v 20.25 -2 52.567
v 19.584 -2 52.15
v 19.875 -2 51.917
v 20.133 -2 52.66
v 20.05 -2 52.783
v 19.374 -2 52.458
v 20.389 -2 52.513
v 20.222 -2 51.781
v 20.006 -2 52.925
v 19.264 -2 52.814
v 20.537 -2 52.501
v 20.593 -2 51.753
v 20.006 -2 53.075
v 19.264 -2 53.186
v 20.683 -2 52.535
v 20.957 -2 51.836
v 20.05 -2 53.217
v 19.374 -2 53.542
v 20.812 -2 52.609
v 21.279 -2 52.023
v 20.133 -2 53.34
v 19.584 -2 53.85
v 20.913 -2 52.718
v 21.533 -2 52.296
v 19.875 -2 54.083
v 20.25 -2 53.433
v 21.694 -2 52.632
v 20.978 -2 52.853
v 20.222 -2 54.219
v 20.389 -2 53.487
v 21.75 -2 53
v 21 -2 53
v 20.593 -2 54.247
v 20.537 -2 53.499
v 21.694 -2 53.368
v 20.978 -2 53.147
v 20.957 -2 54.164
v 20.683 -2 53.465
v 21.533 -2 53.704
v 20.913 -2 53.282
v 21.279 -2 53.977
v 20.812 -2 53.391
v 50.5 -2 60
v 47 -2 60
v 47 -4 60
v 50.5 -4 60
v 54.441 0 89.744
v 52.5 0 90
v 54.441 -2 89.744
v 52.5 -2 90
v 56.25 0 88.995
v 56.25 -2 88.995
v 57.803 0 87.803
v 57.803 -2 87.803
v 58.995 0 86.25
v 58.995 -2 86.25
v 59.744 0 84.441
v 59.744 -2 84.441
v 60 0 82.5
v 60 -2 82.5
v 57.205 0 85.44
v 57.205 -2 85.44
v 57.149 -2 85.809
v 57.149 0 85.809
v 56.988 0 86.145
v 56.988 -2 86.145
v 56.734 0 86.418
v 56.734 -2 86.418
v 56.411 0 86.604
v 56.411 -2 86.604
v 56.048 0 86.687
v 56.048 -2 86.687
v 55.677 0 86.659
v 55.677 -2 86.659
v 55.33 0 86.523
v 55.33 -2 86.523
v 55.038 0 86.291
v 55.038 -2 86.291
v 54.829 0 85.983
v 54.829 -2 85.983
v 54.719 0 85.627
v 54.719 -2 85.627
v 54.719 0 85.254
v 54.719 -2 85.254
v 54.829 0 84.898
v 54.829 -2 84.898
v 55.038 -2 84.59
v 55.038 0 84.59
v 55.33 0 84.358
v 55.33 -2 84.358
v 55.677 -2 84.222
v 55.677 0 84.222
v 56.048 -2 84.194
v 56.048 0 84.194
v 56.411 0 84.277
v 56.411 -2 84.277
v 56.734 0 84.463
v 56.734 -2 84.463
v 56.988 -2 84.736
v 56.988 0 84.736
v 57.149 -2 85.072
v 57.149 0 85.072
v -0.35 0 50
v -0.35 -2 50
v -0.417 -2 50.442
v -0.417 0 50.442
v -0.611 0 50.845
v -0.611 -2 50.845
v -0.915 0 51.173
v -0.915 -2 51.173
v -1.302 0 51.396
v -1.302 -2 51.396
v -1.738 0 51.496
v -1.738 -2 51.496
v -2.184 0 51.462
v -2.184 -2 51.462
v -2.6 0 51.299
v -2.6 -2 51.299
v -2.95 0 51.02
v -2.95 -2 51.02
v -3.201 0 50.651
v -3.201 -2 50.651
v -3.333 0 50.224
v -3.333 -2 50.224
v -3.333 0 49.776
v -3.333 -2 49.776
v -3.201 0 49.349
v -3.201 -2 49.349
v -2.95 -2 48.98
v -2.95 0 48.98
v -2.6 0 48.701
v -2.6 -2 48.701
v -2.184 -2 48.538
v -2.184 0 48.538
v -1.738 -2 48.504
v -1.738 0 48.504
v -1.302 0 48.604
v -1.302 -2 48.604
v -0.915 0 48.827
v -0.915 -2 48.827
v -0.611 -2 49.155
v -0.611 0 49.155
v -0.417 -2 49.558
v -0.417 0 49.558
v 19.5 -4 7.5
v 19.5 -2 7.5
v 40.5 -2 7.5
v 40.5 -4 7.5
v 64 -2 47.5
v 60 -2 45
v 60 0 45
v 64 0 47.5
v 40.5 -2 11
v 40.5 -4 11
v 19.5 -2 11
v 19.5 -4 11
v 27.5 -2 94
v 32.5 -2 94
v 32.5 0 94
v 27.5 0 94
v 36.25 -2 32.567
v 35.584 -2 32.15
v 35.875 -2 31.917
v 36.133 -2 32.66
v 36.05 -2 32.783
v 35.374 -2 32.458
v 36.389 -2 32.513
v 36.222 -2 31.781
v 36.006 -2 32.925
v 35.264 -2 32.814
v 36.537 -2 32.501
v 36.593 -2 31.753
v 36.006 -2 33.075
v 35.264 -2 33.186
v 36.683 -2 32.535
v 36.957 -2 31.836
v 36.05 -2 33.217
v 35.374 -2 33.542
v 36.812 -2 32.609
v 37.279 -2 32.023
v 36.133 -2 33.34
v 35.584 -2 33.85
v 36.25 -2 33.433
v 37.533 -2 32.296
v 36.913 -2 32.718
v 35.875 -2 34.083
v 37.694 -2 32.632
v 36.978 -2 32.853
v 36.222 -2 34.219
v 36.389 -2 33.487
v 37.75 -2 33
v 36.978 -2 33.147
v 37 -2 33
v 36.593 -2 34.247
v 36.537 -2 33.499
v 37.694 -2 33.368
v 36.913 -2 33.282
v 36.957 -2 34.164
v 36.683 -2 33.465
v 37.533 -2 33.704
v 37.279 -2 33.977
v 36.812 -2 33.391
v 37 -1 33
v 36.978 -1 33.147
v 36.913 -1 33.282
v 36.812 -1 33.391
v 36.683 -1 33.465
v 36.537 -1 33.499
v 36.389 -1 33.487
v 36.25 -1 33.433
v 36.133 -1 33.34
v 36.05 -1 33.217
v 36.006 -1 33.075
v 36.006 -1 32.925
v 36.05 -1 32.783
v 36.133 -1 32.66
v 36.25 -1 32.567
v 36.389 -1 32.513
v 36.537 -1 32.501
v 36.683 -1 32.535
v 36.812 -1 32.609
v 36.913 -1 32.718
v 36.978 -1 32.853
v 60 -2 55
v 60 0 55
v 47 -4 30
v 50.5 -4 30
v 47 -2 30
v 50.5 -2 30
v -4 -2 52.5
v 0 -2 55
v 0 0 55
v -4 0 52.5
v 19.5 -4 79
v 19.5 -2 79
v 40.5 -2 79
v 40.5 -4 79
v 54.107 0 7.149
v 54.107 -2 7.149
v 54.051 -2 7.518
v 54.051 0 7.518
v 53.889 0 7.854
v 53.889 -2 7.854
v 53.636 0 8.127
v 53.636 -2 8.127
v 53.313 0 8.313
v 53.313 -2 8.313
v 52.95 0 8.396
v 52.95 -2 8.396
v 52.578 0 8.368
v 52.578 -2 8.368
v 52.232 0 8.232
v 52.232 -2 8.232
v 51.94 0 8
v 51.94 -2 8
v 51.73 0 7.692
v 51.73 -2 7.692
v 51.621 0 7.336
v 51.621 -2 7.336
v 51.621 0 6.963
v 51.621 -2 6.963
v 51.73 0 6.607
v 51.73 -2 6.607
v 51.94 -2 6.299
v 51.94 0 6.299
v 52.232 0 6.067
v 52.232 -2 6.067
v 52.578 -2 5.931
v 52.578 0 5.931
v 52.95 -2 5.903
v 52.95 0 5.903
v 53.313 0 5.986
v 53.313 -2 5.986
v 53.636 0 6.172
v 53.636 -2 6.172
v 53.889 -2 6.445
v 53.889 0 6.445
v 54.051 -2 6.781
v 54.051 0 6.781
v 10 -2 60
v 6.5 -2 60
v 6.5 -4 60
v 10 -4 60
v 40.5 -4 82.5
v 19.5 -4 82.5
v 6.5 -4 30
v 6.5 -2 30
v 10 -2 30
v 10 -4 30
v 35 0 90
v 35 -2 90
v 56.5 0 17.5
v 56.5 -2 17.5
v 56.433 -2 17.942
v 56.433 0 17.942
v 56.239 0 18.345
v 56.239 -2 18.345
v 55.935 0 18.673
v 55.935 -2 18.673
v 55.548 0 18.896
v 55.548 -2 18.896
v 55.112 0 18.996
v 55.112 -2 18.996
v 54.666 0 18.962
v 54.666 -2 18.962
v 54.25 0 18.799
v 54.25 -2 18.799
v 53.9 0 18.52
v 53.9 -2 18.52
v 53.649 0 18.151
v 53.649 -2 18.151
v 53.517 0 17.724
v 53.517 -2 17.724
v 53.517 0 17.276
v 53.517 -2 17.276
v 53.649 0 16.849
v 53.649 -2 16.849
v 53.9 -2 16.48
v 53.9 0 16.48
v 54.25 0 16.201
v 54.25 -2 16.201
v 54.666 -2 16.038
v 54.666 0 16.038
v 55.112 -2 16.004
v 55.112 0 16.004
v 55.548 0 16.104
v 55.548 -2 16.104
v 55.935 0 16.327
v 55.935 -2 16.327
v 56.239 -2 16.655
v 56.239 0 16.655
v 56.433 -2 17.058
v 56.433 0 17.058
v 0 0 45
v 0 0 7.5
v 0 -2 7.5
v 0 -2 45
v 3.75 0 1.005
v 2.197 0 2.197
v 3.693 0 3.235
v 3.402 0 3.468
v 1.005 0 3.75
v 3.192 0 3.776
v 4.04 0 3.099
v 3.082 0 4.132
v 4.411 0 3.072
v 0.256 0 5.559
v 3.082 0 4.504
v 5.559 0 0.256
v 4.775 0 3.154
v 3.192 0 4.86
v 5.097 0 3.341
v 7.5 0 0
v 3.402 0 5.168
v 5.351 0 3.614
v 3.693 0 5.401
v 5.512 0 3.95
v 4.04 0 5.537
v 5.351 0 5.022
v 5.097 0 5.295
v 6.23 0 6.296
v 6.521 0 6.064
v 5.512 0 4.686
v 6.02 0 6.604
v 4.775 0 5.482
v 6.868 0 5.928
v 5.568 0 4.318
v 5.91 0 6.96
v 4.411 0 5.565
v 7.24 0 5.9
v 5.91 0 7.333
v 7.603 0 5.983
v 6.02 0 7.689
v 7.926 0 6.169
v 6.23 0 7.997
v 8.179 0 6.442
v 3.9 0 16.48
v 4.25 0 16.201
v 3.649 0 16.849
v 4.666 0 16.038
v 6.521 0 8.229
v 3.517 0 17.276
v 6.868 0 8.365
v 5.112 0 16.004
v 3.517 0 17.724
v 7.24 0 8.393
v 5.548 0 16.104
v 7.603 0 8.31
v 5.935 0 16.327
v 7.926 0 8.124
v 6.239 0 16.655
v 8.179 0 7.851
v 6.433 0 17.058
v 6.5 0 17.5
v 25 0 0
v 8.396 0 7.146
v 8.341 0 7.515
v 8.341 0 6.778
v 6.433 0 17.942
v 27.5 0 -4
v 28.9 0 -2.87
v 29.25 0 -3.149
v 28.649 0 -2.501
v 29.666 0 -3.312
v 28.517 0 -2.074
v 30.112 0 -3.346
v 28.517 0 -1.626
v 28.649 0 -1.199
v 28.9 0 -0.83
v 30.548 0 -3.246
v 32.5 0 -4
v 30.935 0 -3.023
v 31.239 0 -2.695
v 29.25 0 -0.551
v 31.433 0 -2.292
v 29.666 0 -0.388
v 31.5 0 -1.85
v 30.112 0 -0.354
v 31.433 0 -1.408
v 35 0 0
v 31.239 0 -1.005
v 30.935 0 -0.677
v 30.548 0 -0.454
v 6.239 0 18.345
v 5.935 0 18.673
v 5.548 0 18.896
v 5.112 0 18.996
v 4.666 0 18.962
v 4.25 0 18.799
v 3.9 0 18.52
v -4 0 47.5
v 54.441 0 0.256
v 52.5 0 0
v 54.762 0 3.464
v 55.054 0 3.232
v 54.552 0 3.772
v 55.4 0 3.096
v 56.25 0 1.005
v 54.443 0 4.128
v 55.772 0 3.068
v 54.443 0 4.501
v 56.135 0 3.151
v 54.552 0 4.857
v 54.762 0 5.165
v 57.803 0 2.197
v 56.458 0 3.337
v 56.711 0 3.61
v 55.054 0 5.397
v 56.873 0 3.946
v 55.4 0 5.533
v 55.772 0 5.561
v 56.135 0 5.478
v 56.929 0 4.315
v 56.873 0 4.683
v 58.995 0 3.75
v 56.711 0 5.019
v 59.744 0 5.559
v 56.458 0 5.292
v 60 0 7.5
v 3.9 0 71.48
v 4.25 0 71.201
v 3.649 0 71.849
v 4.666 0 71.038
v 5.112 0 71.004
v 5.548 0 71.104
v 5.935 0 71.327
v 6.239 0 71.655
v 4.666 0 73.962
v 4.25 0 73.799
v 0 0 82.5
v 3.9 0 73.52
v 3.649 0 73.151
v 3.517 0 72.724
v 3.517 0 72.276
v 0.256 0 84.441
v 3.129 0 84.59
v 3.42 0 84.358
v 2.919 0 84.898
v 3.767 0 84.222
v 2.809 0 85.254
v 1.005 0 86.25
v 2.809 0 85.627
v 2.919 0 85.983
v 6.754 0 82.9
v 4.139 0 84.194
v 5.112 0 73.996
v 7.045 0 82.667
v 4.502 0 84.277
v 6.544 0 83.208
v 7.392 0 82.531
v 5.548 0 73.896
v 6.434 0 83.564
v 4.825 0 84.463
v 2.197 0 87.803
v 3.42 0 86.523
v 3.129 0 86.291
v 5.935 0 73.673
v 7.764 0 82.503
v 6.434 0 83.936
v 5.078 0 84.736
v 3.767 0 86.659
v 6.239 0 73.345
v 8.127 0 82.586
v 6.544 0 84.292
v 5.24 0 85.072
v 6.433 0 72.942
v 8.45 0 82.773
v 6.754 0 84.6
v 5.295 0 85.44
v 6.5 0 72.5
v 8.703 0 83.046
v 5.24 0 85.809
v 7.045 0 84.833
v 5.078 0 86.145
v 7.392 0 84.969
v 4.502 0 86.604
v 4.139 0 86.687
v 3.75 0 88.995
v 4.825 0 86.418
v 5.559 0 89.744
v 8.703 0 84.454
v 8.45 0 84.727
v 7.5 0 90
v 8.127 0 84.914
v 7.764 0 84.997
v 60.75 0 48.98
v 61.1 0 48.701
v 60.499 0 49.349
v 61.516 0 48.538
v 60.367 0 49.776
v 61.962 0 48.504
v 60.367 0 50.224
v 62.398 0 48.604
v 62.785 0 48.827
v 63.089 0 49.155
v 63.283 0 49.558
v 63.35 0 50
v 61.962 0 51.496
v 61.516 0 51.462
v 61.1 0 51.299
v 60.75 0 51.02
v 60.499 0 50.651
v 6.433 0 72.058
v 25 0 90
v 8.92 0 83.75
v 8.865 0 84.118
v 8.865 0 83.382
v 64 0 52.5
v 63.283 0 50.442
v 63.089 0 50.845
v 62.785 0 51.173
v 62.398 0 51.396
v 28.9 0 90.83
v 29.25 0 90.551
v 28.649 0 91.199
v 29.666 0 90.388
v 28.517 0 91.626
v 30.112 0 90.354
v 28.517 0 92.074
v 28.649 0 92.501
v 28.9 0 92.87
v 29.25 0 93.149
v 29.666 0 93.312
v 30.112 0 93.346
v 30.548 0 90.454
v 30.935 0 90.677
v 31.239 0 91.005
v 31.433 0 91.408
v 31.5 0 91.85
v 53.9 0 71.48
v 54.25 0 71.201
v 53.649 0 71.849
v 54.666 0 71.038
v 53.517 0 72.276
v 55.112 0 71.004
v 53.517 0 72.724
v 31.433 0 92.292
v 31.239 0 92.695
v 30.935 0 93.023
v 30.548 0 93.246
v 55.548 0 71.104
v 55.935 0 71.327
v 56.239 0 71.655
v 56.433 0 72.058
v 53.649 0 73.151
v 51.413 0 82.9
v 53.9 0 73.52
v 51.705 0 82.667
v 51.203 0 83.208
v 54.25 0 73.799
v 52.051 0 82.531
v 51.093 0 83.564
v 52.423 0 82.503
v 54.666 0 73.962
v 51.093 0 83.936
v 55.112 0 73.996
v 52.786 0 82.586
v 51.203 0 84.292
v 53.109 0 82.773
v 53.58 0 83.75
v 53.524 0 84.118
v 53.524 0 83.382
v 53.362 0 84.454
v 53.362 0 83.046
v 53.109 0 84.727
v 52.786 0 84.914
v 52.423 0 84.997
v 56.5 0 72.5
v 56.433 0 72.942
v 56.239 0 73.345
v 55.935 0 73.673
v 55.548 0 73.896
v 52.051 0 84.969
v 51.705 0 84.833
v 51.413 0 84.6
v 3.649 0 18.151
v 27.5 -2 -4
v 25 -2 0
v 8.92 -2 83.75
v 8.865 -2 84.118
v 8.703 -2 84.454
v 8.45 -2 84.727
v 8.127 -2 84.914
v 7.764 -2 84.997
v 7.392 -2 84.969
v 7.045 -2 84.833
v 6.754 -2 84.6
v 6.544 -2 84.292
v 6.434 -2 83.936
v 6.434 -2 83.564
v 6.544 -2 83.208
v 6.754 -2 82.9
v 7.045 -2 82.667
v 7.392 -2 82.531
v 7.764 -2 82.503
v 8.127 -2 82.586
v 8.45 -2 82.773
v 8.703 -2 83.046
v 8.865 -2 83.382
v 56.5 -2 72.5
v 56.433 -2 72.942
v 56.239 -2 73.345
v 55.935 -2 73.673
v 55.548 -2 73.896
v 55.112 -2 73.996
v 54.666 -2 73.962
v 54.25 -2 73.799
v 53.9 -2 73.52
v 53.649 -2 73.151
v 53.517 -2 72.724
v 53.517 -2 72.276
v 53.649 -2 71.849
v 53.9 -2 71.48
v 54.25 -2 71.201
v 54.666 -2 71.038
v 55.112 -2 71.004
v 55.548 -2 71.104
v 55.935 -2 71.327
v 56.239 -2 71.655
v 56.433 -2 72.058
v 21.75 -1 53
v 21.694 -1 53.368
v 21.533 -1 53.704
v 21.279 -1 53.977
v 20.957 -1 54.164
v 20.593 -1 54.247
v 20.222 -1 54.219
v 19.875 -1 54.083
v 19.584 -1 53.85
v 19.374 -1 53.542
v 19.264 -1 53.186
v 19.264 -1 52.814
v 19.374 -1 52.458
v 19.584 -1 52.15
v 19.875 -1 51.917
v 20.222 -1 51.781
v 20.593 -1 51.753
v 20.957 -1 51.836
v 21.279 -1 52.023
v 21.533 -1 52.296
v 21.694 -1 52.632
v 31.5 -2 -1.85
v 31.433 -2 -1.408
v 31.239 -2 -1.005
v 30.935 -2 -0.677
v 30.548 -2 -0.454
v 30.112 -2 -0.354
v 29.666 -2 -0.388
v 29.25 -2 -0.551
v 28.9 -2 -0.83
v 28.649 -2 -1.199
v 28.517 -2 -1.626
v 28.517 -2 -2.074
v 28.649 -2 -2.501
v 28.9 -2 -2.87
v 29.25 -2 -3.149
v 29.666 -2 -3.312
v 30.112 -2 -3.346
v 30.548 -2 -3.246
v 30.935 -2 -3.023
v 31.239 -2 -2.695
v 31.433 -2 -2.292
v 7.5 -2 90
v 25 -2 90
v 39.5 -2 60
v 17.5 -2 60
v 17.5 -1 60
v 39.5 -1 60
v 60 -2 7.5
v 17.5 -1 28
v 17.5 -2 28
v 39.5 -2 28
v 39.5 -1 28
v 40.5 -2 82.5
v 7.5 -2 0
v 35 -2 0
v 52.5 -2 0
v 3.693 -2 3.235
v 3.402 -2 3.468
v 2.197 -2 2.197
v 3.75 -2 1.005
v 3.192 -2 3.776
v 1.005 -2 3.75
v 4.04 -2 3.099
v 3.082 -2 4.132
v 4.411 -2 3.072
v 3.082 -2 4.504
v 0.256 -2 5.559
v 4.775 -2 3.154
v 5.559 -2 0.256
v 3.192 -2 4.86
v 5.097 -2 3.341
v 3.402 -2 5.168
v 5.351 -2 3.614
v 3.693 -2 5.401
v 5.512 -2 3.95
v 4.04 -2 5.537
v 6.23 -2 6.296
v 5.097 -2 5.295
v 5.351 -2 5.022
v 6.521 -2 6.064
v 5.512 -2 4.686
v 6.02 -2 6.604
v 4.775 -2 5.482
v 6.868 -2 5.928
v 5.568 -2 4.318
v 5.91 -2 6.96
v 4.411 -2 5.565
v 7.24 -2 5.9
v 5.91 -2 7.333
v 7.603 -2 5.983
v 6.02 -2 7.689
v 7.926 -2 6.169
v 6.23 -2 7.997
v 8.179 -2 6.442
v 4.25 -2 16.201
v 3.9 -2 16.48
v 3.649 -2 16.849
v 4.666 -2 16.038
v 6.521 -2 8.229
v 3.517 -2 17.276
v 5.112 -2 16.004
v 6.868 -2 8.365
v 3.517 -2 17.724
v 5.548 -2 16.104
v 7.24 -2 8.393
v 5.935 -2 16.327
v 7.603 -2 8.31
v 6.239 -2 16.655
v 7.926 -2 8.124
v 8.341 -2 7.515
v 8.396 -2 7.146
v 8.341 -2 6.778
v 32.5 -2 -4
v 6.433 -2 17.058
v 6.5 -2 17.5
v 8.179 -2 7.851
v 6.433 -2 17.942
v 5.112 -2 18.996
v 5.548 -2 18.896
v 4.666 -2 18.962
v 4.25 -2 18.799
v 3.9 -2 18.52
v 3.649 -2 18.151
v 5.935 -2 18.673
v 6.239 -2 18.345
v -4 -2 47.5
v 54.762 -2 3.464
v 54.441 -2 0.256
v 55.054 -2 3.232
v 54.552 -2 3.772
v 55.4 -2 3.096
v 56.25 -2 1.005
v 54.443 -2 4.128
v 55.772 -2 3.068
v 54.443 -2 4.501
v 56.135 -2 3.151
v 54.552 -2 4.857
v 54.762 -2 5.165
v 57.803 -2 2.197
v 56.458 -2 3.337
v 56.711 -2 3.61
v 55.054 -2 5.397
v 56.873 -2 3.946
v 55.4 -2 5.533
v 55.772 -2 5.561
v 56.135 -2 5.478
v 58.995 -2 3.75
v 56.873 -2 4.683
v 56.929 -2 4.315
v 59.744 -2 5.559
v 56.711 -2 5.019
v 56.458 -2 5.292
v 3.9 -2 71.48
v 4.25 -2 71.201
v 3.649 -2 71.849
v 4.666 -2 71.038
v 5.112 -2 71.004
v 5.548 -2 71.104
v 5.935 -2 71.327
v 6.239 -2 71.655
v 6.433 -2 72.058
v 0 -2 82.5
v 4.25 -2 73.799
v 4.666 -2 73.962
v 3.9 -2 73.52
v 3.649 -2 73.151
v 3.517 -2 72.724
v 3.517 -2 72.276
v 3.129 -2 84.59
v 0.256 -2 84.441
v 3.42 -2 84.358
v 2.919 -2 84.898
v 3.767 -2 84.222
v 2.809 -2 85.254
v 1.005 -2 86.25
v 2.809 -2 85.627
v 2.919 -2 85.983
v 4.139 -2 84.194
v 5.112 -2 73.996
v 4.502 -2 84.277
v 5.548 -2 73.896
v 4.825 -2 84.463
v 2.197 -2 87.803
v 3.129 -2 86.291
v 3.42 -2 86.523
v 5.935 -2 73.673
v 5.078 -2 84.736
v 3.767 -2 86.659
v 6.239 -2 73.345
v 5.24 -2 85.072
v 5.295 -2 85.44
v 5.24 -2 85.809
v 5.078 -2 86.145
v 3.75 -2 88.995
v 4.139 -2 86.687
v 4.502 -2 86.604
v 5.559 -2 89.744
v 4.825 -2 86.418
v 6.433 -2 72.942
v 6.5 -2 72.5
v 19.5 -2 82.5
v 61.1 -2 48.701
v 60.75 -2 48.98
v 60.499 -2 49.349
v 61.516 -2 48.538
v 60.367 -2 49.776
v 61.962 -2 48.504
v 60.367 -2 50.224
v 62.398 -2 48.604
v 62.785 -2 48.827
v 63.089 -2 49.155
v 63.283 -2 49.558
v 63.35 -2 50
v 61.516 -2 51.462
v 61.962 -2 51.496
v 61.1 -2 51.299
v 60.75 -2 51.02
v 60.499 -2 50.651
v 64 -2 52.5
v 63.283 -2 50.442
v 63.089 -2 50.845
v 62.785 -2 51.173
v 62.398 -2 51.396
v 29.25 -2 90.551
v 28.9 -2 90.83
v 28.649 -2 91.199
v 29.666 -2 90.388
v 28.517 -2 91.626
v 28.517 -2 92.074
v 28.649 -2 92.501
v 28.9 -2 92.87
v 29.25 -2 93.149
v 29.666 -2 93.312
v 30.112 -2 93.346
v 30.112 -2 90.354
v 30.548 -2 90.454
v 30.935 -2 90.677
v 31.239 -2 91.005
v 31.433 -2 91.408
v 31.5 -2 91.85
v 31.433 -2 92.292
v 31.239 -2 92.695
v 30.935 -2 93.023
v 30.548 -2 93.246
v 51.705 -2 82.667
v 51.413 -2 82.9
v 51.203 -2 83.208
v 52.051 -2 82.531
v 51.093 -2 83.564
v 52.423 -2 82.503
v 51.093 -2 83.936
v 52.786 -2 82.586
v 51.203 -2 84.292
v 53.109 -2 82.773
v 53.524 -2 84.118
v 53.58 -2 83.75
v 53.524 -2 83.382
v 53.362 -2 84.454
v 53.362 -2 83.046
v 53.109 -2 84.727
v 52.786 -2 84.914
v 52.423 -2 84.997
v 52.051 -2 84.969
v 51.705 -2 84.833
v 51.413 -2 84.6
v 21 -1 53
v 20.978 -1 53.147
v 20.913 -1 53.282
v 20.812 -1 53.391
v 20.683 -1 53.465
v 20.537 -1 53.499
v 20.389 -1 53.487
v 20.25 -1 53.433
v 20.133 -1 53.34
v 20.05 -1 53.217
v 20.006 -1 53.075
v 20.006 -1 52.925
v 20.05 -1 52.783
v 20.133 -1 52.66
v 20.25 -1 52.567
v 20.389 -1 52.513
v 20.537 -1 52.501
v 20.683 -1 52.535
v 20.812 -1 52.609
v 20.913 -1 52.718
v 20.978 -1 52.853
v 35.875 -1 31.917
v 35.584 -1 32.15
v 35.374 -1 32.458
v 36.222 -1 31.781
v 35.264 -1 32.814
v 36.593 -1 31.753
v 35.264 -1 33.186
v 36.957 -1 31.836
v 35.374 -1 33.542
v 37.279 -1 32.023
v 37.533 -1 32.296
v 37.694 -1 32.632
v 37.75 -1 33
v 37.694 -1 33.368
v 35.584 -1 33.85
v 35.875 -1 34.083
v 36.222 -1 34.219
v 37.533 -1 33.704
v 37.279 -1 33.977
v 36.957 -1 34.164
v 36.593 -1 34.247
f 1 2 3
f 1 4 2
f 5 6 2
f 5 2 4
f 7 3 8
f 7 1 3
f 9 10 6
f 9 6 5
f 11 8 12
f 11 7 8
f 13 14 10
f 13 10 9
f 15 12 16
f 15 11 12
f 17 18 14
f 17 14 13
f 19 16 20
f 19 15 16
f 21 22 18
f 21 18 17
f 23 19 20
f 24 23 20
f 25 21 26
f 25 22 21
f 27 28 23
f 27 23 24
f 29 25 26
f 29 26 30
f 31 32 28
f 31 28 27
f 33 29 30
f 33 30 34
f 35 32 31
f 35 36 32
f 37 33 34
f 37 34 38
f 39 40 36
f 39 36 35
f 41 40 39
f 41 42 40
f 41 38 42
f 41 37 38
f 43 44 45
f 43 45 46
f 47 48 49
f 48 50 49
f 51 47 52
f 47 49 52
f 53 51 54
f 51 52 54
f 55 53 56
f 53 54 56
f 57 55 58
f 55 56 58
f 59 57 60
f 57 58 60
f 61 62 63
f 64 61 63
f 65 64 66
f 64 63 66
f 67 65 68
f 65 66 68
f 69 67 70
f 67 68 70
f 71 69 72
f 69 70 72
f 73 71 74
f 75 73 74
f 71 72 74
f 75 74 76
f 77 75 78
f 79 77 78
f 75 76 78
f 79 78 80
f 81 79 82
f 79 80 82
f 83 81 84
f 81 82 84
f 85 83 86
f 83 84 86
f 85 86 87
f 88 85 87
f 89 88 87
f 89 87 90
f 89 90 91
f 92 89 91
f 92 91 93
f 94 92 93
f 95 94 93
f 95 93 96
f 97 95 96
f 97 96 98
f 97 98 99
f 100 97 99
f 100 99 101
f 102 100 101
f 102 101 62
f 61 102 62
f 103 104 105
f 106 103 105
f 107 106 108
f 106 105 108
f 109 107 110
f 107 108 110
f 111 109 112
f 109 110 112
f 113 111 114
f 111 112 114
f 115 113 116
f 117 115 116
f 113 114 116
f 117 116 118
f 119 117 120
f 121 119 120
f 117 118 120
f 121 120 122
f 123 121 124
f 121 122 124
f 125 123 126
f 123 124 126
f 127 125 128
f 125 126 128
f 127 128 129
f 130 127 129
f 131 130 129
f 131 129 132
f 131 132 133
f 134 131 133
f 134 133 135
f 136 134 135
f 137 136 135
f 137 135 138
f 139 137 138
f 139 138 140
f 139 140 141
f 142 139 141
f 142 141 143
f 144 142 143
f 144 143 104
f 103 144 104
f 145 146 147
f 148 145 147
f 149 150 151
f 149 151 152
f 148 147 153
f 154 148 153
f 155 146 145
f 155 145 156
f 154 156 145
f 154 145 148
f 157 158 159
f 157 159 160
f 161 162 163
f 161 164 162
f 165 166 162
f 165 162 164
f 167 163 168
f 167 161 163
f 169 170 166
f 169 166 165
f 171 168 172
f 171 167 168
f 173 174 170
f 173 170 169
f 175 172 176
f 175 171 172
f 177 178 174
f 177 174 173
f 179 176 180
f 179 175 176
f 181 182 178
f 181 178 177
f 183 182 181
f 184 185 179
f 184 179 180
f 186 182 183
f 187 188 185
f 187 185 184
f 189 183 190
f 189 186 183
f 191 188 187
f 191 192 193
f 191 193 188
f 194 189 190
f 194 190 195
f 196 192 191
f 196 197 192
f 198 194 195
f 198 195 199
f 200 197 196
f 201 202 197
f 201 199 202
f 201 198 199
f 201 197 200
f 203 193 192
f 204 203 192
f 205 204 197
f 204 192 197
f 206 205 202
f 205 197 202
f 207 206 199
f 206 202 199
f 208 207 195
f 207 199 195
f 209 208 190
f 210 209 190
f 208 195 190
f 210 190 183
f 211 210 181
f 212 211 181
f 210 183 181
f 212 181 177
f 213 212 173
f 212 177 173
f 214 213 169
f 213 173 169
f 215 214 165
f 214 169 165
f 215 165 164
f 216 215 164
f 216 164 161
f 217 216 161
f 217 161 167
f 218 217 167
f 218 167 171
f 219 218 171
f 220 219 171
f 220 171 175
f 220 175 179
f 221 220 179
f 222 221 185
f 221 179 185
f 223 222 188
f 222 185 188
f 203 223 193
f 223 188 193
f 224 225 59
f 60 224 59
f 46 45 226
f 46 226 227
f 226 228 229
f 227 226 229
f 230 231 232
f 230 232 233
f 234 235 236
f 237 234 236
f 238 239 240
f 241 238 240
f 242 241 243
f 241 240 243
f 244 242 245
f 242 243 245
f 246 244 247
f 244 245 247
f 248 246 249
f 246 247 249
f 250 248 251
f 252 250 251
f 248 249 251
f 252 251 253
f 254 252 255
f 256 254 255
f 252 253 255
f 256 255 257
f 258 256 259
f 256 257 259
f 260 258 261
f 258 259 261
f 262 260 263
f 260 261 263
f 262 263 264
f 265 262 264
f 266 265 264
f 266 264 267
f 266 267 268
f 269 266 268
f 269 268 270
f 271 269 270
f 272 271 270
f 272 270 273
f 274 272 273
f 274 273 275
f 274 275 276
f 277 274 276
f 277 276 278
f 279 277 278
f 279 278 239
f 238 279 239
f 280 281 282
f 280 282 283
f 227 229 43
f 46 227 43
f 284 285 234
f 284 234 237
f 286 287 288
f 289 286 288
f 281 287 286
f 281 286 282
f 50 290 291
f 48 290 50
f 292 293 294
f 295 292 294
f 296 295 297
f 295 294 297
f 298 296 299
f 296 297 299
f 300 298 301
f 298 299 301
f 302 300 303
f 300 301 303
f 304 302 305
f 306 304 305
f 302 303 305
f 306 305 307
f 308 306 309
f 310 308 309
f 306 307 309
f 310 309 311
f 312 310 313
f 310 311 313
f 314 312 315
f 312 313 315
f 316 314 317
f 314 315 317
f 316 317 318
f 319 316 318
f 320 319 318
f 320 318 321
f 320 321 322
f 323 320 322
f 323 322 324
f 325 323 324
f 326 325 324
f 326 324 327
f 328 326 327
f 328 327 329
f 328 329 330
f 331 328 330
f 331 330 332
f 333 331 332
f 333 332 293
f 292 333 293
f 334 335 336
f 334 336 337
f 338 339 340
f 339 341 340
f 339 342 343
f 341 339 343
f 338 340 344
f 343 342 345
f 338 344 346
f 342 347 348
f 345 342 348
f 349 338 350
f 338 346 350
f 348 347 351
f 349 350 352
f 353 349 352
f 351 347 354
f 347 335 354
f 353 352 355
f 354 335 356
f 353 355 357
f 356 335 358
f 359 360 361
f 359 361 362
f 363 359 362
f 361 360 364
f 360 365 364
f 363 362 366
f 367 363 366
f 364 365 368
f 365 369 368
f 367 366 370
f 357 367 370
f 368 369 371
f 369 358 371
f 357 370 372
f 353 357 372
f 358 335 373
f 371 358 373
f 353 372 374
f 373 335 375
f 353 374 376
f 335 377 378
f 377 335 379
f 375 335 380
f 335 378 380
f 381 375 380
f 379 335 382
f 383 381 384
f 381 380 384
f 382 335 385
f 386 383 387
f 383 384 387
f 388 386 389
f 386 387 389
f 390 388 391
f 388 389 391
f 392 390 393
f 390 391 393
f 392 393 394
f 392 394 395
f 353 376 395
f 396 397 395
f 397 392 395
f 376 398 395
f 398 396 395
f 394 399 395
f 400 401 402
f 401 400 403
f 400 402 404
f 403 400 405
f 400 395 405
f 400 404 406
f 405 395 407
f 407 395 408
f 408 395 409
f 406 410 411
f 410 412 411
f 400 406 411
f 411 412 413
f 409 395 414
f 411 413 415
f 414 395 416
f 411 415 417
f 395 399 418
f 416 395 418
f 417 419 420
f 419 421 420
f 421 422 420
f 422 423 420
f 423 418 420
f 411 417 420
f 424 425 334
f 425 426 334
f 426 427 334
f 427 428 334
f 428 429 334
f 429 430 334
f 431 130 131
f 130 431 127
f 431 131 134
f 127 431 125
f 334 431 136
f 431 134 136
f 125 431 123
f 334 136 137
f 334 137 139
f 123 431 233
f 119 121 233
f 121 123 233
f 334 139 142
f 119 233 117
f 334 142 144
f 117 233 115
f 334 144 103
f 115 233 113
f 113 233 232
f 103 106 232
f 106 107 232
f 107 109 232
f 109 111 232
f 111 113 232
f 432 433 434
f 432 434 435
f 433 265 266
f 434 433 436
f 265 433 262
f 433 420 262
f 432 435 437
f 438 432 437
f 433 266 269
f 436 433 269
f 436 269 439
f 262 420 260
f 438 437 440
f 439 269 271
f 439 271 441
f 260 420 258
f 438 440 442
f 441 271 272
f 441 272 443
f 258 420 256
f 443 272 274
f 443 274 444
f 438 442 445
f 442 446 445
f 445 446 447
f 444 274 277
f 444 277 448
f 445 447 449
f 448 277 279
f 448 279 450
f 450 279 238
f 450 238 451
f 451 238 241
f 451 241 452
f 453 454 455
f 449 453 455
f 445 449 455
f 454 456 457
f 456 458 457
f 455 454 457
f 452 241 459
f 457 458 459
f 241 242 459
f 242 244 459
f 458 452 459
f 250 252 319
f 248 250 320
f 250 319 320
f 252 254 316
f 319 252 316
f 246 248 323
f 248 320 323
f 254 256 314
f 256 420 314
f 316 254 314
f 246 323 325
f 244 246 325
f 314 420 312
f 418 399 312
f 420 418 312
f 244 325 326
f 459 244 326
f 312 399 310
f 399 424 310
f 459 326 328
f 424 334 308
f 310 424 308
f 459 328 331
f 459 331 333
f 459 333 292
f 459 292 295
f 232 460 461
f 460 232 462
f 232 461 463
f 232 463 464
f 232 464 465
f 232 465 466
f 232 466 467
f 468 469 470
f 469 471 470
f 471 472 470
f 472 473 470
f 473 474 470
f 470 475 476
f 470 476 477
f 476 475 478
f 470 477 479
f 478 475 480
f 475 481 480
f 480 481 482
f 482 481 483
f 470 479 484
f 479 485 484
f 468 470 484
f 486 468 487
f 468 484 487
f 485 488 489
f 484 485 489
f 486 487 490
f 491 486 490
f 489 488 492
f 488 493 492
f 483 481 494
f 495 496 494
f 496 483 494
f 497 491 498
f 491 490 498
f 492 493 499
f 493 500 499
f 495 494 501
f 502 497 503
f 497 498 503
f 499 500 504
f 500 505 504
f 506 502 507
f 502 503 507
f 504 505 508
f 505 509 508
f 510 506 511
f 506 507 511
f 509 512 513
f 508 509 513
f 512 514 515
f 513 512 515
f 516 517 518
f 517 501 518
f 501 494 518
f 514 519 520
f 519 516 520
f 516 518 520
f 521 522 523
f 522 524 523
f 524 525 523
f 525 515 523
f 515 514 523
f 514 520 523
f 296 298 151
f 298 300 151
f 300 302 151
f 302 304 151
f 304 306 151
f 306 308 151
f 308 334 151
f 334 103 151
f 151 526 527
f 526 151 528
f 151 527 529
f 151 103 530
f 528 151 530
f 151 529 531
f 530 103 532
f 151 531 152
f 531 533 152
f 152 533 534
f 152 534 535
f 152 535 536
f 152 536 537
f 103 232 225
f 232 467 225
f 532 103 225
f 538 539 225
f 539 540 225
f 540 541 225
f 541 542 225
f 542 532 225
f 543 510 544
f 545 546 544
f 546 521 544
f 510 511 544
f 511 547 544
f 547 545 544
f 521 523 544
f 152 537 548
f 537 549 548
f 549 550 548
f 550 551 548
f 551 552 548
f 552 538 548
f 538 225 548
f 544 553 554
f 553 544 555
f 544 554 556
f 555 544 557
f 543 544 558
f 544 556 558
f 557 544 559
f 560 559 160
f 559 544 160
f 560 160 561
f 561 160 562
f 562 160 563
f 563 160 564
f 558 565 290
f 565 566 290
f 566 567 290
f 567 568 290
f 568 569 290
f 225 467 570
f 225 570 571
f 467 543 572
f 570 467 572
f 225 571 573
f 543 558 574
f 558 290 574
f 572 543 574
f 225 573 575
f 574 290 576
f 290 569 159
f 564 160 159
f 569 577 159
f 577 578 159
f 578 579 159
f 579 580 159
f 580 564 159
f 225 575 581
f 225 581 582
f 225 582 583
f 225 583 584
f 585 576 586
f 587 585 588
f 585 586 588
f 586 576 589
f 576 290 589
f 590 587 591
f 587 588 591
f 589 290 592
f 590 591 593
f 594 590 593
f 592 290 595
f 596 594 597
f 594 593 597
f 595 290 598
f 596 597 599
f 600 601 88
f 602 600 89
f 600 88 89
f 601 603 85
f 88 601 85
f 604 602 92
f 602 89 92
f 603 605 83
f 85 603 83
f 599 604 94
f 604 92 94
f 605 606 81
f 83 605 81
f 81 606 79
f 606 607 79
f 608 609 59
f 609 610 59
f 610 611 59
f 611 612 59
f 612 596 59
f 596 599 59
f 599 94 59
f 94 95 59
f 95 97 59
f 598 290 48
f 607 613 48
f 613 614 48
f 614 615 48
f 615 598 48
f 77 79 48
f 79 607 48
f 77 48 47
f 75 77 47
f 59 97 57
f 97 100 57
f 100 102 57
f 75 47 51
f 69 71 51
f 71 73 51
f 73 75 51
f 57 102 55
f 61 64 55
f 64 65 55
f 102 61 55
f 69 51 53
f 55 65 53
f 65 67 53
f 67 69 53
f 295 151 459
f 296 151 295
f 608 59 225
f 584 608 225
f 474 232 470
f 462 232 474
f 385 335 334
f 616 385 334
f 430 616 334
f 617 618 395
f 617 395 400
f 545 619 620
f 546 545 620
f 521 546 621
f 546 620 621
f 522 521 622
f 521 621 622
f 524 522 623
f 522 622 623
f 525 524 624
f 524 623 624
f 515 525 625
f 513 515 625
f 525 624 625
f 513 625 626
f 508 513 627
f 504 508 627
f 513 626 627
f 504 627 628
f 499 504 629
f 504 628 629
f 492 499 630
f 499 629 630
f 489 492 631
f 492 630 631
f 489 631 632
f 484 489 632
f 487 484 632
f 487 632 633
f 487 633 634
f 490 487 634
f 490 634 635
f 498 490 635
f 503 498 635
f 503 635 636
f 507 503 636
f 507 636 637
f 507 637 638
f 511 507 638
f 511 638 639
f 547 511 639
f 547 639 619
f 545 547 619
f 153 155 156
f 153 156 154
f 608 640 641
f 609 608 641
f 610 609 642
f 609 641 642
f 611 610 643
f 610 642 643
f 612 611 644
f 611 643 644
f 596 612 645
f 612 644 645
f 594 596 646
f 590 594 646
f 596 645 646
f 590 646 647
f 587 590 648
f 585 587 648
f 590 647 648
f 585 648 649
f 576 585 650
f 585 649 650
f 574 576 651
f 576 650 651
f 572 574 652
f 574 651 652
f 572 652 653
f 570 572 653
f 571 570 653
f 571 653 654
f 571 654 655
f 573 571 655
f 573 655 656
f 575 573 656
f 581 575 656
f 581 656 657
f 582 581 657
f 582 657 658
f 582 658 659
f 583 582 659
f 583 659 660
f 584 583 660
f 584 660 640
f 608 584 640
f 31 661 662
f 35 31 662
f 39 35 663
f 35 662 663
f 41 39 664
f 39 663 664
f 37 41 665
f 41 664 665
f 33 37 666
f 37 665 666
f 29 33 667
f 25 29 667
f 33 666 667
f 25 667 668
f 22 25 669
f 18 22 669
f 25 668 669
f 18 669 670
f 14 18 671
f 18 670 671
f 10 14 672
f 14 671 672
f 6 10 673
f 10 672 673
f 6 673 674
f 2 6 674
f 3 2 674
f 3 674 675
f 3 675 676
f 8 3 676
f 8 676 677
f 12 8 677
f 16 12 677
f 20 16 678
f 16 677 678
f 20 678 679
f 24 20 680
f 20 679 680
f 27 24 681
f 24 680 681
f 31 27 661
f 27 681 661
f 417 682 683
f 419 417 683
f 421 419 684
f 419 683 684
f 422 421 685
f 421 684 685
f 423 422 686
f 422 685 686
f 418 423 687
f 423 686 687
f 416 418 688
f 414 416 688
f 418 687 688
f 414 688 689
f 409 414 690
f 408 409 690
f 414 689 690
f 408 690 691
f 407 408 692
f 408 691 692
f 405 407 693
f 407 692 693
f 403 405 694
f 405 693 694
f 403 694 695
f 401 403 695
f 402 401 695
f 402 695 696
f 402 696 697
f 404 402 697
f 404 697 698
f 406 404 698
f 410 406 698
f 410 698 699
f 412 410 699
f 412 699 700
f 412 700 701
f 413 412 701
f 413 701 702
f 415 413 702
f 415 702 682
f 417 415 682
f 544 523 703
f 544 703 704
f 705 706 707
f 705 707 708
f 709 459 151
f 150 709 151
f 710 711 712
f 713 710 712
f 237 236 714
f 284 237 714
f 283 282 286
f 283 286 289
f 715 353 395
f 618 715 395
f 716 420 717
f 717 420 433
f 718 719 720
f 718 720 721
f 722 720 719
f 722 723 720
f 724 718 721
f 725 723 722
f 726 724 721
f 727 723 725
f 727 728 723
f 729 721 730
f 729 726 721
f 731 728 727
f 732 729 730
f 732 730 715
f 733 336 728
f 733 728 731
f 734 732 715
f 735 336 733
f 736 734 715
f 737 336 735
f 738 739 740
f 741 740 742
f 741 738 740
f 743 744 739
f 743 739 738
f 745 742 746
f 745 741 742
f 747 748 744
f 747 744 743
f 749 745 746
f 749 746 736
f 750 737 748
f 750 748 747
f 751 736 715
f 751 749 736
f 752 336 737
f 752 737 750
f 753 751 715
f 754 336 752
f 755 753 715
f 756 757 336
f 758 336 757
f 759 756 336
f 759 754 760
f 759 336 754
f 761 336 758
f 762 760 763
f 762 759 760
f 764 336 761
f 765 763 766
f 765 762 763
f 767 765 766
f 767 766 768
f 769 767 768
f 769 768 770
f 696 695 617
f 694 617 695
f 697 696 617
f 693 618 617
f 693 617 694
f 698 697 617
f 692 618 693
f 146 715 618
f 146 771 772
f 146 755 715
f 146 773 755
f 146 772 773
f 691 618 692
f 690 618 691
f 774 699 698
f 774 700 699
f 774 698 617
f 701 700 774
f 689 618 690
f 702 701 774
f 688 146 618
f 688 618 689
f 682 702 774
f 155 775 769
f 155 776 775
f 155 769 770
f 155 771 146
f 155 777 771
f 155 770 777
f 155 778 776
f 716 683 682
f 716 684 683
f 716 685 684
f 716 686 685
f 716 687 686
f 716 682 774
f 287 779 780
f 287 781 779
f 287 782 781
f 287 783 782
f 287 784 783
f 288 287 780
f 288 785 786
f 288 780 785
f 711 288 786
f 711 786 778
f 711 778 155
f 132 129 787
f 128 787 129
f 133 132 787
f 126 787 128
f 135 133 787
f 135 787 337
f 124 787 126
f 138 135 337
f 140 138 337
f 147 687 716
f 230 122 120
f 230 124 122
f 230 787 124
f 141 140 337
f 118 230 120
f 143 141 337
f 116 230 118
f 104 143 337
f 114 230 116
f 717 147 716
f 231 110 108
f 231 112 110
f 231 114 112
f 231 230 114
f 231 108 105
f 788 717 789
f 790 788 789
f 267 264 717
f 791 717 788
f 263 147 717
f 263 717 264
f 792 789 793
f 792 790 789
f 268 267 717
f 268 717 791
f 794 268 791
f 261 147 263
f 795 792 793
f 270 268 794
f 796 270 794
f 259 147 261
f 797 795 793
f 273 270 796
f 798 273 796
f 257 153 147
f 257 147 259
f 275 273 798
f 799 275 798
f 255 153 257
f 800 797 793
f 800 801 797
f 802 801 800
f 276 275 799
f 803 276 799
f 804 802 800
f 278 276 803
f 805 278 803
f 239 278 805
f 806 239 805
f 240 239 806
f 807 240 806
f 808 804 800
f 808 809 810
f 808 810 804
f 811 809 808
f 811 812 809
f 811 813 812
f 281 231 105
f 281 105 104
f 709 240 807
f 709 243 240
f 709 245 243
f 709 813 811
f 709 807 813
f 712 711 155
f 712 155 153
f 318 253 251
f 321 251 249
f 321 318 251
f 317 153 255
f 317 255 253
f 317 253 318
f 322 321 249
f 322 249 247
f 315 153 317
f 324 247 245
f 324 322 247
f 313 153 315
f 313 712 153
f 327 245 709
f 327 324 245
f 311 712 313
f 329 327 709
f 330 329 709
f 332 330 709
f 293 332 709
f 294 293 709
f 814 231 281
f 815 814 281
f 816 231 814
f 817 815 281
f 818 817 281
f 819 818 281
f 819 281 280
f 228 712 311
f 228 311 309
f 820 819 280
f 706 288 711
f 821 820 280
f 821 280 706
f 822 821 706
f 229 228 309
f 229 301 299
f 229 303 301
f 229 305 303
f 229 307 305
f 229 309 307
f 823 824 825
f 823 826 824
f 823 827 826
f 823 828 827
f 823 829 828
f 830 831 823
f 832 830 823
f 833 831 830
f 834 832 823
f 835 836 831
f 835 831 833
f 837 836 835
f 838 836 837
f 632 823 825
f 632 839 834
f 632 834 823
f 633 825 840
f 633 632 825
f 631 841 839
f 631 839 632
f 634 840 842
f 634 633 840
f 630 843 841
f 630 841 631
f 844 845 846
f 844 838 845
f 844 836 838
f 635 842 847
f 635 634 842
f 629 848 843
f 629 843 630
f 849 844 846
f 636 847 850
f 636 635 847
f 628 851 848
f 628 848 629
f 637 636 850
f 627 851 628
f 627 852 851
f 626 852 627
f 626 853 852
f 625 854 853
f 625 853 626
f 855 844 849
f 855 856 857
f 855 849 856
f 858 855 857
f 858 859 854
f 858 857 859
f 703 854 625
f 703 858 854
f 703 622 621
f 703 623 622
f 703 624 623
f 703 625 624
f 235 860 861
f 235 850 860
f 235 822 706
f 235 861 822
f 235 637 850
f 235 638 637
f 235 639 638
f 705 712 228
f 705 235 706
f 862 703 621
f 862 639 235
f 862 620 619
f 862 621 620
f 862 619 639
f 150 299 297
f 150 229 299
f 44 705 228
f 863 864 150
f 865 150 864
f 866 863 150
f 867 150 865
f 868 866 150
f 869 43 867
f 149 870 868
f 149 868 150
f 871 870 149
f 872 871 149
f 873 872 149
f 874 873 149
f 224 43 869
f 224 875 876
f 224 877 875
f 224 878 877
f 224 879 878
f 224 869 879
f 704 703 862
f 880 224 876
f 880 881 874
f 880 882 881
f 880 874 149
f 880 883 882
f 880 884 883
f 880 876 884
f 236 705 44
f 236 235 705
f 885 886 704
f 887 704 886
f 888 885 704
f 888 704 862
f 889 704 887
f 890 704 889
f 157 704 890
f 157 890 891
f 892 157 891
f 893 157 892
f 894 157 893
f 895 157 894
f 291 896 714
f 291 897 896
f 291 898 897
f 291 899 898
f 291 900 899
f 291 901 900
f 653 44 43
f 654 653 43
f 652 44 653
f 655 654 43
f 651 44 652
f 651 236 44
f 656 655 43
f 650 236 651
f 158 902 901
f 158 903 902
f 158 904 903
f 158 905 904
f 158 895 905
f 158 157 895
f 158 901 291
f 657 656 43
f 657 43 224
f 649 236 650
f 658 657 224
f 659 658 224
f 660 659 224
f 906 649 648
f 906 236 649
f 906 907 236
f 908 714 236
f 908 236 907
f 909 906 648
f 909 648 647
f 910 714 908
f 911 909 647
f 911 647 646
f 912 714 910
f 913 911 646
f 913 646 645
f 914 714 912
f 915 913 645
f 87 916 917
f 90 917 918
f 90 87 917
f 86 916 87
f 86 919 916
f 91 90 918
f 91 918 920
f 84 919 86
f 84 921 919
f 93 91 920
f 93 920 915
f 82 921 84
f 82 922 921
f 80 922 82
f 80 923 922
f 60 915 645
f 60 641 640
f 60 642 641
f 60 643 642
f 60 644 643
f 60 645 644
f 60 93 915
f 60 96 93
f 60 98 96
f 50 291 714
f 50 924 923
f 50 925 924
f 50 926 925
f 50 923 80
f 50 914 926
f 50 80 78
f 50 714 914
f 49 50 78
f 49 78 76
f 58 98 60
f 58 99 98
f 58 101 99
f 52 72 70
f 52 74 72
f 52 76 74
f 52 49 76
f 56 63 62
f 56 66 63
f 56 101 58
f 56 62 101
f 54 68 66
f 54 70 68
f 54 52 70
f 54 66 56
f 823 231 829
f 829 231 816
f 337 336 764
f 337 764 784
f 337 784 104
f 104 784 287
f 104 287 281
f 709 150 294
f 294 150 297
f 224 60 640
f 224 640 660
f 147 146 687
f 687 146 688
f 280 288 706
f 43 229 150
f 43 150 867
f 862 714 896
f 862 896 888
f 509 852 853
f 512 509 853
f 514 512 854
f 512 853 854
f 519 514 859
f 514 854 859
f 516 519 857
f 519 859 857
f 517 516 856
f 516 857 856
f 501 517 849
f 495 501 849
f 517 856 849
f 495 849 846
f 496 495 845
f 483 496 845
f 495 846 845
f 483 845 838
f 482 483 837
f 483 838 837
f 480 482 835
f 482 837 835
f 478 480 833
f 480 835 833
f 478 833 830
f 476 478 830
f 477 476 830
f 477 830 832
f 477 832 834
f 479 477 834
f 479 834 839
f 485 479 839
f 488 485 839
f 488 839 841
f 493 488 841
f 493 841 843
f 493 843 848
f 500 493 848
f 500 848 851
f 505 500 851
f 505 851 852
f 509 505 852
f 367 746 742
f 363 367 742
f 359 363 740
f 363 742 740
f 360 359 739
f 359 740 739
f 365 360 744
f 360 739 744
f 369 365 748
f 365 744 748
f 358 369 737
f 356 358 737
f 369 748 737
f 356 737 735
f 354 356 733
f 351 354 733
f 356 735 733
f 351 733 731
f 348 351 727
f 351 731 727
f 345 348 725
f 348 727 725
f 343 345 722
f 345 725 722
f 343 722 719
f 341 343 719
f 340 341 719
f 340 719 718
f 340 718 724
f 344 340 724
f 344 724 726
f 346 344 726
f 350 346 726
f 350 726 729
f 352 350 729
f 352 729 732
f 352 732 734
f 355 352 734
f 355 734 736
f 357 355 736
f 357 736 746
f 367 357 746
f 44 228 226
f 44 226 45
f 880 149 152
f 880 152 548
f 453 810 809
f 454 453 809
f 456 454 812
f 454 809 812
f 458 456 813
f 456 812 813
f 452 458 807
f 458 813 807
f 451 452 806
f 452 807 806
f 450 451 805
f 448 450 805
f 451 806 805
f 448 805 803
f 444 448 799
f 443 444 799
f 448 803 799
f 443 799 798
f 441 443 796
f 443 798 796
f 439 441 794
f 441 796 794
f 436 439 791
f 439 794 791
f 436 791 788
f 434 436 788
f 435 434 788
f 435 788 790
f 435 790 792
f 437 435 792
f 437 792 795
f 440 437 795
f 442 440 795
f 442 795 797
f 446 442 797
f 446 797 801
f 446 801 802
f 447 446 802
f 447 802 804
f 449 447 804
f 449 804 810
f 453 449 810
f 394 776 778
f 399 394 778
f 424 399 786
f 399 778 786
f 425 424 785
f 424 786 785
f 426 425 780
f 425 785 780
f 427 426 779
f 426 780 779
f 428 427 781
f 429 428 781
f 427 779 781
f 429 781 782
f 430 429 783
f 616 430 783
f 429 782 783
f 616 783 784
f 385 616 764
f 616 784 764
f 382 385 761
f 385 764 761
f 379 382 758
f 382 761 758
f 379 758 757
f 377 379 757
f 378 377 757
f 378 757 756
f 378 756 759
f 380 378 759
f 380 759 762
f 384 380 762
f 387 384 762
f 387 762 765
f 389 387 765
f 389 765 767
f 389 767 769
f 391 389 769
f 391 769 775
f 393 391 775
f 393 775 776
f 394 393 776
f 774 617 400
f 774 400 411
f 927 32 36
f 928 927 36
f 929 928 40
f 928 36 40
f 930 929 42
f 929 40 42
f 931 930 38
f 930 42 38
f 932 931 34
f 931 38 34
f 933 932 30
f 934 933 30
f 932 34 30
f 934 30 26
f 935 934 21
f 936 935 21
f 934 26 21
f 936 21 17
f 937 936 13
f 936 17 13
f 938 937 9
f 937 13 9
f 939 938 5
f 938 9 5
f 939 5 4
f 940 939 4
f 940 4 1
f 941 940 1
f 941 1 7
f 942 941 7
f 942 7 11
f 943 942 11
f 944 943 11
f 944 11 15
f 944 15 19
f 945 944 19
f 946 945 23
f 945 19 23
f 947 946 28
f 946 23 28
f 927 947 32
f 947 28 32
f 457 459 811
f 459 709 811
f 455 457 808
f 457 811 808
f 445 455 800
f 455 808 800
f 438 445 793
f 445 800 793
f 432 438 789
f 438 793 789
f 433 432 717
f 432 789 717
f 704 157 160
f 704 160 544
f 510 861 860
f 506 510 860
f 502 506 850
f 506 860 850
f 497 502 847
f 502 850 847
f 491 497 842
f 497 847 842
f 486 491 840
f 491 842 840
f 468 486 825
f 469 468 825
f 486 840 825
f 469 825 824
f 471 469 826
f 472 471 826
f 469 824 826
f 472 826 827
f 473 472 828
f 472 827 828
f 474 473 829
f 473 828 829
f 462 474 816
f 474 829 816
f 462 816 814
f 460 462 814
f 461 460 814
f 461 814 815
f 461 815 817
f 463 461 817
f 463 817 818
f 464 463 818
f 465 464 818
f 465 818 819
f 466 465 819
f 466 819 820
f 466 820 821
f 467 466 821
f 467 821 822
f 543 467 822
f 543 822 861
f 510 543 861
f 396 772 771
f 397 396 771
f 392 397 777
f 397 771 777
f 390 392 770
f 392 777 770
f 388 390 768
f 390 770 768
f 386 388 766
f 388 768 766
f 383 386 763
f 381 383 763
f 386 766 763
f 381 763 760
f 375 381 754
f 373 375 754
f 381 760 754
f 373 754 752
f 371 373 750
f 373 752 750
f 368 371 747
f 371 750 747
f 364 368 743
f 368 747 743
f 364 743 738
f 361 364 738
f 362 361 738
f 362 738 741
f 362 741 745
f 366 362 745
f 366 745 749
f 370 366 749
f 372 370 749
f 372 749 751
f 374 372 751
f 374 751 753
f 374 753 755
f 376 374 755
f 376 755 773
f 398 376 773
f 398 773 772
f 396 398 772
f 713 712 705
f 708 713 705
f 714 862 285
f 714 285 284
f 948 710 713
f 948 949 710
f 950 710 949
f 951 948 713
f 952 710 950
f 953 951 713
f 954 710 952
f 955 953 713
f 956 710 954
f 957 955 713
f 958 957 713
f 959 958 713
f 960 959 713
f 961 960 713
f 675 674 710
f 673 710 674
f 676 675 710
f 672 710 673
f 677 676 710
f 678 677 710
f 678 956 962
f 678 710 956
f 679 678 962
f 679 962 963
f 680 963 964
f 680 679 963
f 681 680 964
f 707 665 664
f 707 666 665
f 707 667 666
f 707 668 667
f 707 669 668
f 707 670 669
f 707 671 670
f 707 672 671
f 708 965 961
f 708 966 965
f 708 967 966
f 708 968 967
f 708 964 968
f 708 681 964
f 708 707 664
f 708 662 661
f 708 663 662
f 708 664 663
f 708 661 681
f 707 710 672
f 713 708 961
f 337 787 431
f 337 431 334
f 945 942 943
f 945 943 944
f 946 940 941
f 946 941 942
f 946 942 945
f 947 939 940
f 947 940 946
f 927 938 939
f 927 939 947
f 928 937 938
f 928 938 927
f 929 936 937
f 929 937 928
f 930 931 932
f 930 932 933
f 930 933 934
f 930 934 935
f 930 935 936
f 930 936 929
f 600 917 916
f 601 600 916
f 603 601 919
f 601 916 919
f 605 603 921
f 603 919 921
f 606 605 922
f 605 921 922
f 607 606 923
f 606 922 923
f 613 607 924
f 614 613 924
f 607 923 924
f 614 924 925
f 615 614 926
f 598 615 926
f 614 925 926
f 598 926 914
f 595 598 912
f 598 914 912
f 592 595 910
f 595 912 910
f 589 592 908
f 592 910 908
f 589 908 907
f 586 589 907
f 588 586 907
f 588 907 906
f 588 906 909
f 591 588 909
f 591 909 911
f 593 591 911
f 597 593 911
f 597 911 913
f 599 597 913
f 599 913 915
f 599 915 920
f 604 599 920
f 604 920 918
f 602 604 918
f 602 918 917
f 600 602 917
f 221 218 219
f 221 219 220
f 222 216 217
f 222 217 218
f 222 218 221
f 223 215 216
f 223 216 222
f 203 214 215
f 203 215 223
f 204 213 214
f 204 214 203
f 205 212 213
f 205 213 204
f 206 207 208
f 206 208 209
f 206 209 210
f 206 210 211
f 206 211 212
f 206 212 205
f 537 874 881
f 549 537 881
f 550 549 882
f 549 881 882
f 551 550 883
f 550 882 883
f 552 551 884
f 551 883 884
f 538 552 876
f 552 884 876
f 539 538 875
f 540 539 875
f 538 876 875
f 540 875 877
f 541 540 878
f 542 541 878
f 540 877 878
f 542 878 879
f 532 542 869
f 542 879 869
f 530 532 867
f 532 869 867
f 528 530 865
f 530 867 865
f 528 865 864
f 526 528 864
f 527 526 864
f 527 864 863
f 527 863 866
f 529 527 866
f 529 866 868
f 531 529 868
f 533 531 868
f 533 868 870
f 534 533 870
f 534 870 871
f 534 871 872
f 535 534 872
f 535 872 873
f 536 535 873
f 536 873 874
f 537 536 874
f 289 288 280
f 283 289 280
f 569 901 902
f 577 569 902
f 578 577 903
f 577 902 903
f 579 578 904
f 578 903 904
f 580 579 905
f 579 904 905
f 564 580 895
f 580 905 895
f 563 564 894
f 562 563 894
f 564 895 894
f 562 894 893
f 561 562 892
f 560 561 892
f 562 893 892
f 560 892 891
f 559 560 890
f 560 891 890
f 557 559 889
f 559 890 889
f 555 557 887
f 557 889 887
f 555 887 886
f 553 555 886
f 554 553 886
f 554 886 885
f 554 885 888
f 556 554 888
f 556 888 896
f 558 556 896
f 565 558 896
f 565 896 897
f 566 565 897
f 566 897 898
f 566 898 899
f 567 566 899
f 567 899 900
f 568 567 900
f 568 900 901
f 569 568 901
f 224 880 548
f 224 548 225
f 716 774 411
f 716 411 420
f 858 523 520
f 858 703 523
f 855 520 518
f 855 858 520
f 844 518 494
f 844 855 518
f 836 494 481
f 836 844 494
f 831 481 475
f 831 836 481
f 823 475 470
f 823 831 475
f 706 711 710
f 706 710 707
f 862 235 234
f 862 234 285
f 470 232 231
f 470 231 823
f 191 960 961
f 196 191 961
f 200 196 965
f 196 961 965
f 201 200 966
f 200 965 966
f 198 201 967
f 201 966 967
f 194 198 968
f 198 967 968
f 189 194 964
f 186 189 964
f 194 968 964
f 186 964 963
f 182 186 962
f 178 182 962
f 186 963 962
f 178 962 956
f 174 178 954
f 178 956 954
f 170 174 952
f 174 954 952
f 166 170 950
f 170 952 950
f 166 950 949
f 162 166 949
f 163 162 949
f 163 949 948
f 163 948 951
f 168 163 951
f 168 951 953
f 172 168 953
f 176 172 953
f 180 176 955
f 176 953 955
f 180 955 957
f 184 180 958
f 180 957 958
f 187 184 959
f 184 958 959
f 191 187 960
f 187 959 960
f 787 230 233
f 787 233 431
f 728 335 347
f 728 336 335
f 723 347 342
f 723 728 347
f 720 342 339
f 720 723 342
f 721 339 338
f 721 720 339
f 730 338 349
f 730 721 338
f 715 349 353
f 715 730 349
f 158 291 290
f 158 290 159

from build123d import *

# Parameters (mm, degrees)
F0_W      = 60
F0_H      = 90
F1_DEPTH  = 2
F2_W      = 22
F2_H      = 32
F3_DEPTH  = 1
F4_R      = 1.25
F5_DEPTH  = 1
F6_R      = 0.5
F7_DEPTH  = 1
F8_R      = 7.5
F9_R      = 7.5
F11_DEPTH = 2
F12_R     = 1.5
F13_DEPTH = 3
F14_W     = 3.5
F14_H     = 30
F15_DEPTH = 2
F16_W     = 21
F16_H     = 3.5
F17_DEPTH = 2
F18_W     = 21
F18_H     = 3.5
F19_DEPTH = 2
F20_R     = 1.25
F21_DEPTH = 25
F22_R     = 1.5
F23_DEPTH = 25


with BuildPart() as f1:
    # F0 (on Front) → F1 (new body)
    with BuildSketch(Plane.XZ):
        with Locations((30, 45)):
            Rectangle(F0_W, F0_H)
    extrude(amount=F1_DEPTH)

    # F2 (on face) → F3 (cut)
    with BuildSketch(Plane.XZ.offset(2)):
        with Locations((28.5, 44)):
            Rectangle(F2_W, F2_H)
    extrude(amount=-F3_DEPTH, mode=Mode.SUBTRACT)

    # F4 (on face) → F5 (join)
    with BuildSketch(Plane.XZ.offset(1)):
        with Locations((20.5, 53)):
            Circle(F4_R)
        with Locations((36.5, 33)):
            Circle(F4_R)
    extrude(amount=F5_DEPTH)

    # F6 (on face) → F7 (cut)
    with BuildSketch(Plane.XZ.offset(2)):
        with Locations((20.5, 53)):
            Circle(F6_R)
        with Locations((36.5, 33)):
            Circle(F6_R)
    extrude(amount=-F7_DEPTH, mode=Mode.SUBTRACT)

    # F8
    f8_edges = [f1.edges().sort_by_distance(p)[0] for p in [
        (60, -1, 90),
    ]]
    fillet(f8_edges, radius=F8_R)

    # F9
    f9_edges = [f1.edges().sort_by_distance(p)[0] for p in [
        (0, -1, 90),
        (0, -1, 0),
        (60, -1, 0),
    ]]
    fillet(f9_edges, radius=F9_R)

    # F10 (on face) → F11 (join)
    with BuildSketch(Plane.XZ.offset(2)):
        Polygon((0, 45), (0, 55), (-4, 52.5), (-4, 47.5), align=None)
        Polygon((64, 52.5), (60, 55), (60, 45), (64, 47.5), align=None)
        Polygon((27.5, 94), (25, 90), (35, 90), (32.5, 94), align=None)
        Polygon((35, 0), (25, 0), (27.5, -4), (32.5, -4), align=None)
    extrude(amount=-F11_DEPTH)

    # F12 (on face) → F13 (cut)
    with BuildSketch(Plane.XZ.offset(2)):
        with Locations((30, 91.85)):
            Circle(F12_R)
        with Locations((61.85, 50)):
            Circle(F12_R)
        with Locations((30, -1.85)):
            Circle(F12_R)
        with Locations((-1.85, 50)):
            Circle(F12_R)
    extrude(amount=-F13_DEPTH, mode=Mode.SUBTRACT)

    # F14 (on face) → F15 (join)
    with BuildSketch(Plane.XZ.offset(2)):
        with Locations((8.25, 45)):
            Rectangle(F14_W, F14_H)
        with Locations((48.75, 45)):
            Rectangle(F14_W, F14_H)
    extrude(amount=F15_DEPTH)

    # F16 (on face) → F17 (join)
    with BuildSketch(Plane.XZ.offset(2)):
        with Locations((30, 9.25)):
            Rectangle(F16_W, F16_H)
    extrude(amount=F17_DEPTH)

    # F18 (on face) → F19 (join)
    with BuildSketch(Plane.XZ.offset(2)):
        with Locations((30, 80.75)):
            Rectangle(F18_W, F18_H)
    extrude(amount=F19_DEPTH)

    # F20 (on face) → F21 (cut)
    with BuildSketch(Plane.XZ.offset(2)):
        with Locations((4.0452558799, 85.4404978659)):
            Circle(F20_R)
        with Locations((55.9547441201, 85.4404978659)):
            Circle(F20_R)
        with Locations((55.6786040567, 4.3146376432)):
            Circle(F20_R)
        with Locations((4.3180194842, 4.3180194851)):
            Circle(F20_R)
        with Locations((7.146446609, 7.1464466098)):
            Circle(F20_R)
        with Locations((52.8565831787, 7.1494565376)):
            Circle(F20_R)
        with Locations((52.3295245454, 83.75)):
            Circle(F20_R)
        with Locations((7.6704754546, 83.75)):
            Circle(F20_R)
    extrude(amount=-F21_DEPTH, mode=Mode.SUBTRACT)

    # F22 (on face) → F23 (cut)
    with BuildSketch(Plane.XZ.offset(2)):
        with Locations((5, 72.5)):
            Circle(F22_R)
        with Locations((5, 17.5)):
            Circle(F22_R)
        with Locations((55, 72.5)):
            Circle(F22_R)
        with Locations((55, 17.5)):
            Circle(F22_R)
    extrude(amount=-F23_DEPTH, mode=Mode.SUBTRACT)


solid = f1.part
